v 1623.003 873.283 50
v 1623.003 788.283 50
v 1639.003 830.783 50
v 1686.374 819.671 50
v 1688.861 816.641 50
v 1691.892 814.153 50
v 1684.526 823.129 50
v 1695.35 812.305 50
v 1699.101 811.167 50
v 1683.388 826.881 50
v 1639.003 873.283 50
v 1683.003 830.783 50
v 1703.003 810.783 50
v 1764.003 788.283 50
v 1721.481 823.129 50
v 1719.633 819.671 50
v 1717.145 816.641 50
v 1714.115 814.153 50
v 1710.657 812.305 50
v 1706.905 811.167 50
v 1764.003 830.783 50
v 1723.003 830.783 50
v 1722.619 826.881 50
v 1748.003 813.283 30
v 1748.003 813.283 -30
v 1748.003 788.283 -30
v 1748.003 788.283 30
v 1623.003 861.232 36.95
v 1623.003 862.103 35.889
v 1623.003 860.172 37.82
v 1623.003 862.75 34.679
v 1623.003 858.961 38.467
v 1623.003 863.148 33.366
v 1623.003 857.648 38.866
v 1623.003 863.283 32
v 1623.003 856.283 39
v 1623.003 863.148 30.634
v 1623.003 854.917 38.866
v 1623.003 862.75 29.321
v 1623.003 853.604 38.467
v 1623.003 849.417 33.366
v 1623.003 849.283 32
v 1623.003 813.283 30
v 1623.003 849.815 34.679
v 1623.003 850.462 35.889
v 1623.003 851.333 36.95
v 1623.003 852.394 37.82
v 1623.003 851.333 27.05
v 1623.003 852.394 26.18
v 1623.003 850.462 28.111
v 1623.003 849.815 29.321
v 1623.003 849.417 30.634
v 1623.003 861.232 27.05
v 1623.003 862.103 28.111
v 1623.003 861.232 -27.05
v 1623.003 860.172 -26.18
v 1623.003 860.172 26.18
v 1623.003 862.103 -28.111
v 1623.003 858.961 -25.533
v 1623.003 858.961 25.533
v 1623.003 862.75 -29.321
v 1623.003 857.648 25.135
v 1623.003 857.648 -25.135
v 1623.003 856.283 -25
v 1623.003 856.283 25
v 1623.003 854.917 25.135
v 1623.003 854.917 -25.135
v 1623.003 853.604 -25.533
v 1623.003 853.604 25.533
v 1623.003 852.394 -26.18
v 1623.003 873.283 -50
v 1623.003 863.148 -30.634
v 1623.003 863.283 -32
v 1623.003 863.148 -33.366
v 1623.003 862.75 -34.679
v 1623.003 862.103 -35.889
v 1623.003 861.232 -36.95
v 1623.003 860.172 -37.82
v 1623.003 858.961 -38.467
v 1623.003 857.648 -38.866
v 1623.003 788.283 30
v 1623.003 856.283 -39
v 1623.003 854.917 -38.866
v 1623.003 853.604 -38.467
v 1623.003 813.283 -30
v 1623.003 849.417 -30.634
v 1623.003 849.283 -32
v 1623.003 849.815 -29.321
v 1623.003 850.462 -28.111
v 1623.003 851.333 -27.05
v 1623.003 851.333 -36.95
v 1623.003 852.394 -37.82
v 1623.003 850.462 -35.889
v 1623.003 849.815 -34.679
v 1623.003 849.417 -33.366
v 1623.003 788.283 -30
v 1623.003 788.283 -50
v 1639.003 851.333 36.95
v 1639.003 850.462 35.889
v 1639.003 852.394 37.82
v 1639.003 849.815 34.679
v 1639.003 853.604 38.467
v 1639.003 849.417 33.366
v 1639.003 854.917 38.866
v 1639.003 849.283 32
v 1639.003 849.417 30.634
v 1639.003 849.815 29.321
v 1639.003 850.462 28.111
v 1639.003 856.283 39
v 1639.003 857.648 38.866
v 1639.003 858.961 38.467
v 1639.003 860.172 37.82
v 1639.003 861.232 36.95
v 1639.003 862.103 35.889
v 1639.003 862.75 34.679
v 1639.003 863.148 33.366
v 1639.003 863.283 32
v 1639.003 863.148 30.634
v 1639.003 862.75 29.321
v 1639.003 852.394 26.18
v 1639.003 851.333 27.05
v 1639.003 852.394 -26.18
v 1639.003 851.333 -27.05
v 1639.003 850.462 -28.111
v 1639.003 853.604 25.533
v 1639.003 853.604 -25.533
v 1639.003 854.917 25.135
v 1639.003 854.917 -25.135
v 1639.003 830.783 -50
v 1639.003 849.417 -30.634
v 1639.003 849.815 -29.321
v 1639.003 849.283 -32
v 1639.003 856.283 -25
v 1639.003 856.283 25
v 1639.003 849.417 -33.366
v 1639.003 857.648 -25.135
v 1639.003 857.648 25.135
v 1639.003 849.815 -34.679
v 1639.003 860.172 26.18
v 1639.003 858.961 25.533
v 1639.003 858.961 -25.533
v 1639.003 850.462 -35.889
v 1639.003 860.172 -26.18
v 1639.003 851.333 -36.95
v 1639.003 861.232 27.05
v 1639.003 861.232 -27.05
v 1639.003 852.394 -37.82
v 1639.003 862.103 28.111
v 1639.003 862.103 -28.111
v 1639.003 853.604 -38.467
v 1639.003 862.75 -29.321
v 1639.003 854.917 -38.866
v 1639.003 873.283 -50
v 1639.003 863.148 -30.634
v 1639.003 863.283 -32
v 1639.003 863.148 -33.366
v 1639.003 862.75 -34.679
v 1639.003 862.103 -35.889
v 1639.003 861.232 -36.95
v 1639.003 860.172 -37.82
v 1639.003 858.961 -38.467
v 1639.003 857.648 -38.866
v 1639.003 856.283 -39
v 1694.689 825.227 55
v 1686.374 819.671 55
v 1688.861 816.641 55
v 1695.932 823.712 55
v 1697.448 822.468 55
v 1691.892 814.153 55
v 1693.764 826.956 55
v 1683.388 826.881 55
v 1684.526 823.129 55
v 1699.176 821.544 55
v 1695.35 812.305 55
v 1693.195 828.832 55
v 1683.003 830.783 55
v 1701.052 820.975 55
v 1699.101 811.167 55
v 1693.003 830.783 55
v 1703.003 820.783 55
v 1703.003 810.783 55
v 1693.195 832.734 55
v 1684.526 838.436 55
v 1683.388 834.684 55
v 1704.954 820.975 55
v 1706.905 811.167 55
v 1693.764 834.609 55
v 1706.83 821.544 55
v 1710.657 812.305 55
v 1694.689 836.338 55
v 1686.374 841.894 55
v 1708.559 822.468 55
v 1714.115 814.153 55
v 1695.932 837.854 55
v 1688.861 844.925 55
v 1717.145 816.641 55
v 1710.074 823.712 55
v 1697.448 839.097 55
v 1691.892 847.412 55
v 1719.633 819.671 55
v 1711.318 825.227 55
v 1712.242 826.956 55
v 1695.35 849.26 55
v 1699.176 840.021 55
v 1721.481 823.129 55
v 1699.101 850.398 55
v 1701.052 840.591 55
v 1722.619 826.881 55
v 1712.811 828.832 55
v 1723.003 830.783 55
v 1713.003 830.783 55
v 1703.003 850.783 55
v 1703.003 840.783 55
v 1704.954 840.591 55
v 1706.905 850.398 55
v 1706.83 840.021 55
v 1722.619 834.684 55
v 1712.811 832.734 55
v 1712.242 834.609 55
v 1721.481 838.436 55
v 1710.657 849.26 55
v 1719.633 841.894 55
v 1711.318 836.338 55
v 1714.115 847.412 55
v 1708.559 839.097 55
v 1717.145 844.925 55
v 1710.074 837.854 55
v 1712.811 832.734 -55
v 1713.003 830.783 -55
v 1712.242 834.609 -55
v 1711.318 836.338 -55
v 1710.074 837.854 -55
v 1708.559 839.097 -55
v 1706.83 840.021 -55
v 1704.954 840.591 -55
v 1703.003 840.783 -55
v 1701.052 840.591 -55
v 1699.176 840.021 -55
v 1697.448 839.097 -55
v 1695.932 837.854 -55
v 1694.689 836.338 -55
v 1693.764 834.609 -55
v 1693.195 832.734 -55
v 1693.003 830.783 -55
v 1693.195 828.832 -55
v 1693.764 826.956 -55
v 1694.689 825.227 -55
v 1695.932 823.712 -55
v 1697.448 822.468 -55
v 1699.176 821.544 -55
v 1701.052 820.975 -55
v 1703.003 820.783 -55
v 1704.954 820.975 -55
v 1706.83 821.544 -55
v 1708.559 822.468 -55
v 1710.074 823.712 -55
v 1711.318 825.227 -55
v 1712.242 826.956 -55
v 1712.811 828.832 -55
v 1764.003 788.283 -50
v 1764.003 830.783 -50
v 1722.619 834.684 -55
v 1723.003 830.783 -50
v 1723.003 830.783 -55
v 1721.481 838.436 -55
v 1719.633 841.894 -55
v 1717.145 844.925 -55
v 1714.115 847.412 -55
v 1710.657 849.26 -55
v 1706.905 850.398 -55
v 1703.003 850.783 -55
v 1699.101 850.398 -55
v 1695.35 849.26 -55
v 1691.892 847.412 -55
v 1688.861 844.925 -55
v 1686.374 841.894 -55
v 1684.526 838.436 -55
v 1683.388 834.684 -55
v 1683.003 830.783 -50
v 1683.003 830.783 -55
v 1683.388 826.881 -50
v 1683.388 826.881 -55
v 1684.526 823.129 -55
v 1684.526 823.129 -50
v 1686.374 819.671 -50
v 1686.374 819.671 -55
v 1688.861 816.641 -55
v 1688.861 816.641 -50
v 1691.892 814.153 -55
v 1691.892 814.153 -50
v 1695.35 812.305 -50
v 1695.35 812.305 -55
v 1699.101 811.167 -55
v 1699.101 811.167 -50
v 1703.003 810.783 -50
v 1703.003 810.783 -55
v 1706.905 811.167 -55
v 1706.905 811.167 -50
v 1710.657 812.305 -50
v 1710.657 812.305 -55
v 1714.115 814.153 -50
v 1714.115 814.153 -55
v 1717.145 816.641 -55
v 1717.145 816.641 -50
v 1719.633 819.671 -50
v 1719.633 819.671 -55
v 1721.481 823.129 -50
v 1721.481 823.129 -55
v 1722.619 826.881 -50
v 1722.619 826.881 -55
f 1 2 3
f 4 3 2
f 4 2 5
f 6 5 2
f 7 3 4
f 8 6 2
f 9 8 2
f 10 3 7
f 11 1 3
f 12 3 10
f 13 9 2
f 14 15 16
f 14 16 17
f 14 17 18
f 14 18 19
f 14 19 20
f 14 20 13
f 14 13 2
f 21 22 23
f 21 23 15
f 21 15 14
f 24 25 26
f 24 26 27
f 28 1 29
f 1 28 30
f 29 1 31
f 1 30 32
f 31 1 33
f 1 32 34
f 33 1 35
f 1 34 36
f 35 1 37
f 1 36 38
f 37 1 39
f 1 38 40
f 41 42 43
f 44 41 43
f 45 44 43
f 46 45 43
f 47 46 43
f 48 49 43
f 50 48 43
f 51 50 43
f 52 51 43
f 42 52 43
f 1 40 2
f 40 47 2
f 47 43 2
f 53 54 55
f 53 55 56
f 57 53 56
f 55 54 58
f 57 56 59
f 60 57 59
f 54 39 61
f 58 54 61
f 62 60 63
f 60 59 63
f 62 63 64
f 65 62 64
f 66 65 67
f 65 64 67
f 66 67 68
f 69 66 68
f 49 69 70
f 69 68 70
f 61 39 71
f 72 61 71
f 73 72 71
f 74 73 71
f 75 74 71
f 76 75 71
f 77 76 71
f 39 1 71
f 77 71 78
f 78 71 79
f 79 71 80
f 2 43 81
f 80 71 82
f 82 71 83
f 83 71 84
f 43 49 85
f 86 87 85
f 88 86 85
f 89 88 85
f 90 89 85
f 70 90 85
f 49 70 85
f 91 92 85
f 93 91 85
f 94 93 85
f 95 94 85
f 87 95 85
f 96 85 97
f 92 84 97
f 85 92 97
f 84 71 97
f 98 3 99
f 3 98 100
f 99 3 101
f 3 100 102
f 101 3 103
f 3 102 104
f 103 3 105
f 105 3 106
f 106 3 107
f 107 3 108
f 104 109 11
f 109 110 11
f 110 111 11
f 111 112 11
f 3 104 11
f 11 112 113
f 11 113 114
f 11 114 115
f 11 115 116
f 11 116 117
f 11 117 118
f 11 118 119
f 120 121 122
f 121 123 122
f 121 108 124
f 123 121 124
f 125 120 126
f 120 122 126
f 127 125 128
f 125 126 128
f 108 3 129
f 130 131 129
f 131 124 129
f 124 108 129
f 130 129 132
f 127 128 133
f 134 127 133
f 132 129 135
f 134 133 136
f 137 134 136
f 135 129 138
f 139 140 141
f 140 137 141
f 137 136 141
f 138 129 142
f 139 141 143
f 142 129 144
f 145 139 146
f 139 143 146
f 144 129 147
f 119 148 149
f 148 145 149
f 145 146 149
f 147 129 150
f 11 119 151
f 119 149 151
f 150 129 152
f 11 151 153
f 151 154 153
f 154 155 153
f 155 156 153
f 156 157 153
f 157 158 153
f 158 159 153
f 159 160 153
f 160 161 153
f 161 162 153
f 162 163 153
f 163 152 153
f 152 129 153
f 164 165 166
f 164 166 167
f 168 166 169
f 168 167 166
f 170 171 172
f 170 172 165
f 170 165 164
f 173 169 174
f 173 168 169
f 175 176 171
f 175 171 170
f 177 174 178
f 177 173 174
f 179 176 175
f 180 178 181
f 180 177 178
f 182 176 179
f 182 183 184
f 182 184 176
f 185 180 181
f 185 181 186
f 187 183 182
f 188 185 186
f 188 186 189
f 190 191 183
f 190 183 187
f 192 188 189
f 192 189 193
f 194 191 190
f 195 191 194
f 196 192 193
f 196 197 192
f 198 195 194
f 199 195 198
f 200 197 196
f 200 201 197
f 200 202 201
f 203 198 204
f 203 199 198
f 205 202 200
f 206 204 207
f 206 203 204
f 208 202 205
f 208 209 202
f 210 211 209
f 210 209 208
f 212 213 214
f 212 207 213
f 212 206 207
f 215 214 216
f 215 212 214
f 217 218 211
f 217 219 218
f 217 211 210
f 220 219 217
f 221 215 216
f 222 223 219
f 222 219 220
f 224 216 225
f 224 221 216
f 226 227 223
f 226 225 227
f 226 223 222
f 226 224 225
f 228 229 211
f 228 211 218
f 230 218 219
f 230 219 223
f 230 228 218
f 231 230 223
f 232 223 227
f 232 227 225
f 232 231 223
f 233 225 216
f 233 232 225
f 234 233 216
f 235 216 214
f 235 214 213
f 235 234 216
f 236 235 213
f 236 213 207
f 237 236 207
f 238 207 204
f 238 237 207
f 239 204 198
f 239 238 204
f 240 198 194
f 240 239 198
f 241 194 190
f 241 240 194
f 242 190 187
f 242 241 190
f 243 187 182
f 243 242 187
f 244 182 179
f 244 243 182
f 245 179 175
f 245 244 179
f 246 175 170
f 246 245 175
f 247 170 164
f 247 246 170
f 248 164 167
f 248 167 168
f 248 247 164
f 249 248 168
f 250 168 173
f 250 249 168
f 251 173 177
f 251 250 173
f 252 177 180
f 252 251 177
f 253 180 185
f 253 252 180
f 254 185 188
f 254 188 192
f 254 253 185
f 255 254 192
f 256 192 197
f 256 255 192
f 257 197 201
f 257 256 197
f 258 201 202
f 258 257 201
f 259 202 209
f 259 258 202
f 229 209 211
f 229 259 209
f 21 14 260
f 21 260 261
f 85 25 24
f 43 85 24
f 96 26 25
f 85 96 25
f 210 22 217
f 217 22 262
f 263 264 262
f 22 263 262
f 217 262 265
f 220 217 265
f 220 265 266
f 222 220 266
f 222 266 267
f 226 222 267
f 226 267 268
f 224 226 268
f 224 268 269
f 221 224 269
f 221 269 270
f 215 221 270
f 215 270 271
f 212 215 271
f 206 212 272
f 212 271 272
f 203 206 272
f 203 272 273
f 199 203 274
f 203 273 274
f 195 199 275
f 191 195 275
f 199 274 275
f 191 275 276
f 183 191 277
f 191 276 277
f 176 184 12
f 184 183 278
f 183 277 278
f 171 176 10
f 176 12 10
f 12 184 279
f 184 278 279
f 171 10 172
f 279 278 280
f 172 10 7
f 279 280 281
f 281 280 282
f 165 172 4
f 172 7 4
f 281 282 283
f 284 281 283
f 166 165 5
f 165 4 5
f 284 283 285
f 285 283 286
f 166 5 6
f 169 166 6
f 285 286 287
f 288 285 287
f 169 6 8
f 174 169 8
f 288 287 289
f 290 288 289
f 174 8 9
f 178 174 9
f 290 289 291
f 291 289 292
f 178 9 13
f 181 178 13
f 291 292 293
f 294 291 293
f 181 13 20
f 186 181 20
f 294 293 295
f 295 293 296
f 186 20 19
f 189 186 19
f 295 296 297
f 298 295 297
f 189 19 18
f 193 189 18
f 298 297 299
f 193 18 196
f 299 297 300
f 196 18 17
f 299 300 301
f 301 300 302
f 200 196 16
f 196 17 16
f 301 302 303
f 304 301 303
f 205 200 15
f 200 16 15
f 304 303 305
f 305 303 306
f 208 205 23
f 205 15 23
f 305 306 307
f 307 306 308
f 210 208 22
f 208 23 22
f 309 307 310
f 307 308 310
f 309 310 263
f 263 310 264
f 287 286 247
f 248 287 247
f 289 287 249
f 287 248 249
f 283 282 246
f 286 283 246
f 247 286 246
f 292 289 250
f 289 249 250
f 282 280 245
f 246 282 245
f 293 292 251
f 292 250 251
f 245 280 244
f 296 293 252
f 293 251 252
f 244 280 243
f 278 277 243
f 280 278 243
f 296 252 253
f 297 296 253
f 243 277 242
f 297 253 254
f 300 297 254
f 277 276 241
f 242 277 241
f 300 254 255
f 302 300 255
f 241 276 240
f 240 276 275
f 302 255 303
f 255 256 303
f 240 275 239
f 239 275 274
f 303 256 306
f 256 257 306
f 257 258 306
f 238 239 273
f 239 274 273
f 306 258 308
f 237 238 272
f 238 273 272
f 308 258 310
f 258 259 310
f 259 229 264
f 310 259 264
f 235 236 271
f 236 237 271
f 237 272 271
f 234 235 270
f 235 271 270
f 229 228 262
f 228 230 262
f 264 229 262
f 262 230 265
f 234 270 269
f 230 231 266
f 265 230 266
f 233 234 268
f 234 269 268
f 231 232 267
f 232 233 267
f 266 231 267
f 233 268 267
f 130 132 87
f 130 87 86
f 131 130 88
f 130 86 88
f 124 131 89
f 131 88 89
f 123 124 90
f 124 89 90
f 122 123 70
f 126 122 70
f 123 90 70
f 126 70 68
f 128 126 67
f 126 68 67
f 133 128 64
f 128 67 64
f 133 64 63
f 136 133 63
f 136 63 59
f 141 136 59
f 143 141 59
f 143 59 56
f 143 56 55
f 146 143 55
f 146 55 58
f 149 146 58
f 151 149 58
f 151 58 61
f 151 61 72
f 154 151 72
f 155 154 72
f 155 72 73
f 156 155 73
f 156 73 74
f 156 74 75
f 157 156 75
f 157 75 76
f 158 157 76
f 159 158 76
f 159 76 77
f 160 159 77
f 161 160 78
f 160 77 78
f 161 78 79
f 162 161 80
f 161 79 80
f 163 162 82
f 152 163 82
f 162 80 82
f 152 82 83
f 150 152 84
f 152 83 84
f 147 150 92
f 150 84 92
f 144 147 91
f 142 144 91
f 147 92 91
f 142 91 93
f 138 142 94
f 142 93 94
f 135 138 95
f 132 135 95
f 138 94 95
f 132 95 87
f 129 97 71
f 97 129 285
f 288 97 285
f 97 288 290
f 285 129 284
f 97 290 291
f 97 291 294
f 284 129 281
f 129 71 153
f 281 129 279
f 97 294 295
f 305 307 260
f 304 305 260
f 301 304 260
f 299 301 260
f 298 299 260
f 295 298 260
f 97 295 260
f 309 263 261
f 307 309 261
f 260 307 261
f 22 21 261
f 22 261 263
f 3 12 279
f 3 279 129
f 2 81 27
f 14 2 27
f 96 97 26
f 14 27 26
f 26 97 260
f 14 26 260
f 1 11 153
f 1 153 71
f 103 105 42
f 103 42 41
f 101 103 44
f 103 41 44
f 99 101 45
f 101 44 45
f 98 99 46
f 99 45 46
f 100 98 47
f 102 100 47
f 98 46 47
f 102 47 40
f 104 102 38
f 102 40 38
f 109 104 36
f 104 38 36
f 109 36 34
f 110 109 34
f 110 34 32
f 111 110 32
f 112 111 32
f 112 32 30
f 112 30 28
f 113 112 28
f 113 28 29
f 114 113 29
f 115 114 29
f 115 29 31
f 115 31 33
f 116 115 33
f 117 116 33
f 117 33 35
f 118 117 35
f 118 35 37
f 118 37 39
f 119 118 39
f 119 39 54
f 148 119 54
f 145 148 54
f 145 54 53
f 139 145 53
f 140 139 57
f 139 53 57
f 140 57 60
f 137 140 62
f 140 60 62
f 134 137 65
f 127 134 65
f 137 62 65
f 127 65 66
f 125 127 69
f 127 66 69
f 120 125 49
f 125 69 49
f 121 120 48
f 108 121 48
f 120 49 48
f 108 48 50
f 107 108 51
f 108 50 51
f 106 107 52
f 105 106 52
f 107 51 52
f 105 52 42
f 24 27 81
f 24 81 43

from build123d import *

# Parameters (mm, degrees)
BOSS_EXTRUDE1_DEPTH      = 1270
BOSS_EXTRUDE1_DEPTH_BACK = 1270
BOSS_EXTRUDE2_DEPTH      = 1397
BOSS_EXTRUDE2_DEPTH_BACK = 1397
SKETCH1_3_R              = 254
SKETCH2_W                = 1524
SKETCH2_H                = 635
CUT_EXTRUDE1_DEPTH       = 3175
SKETCH3_R                = 177.8
CUT_EXTRUDE2_DEPTH       = 508
SCALE1_SCALE             = 0.0393701


with BuildPart() as part:
    # Sketch1 → Boss-Extrude1 (new, two sides: drawn at the far end of the back side and taken through both)
    with BuildSketch(Plane.XY.offset(-BOSS_EXTRUDE1_DEPTH_BACK)):
        with BuildLine():
            Line((0, 2159), (0, 0))
            Line((0, 0), (3581.4, 0))
            Line((3581.4, 0), (3581.4, 1079.5))
            Line((3581.4, 1079.5), (2540, 1079.5))
            ThreePointArc((2540, 1079.5), (2032, 571.5), (1524, 1079.5))
            Line((1524, 1079.5), (406.4, 1079.5))
            Line((406.4, 1079.5), (406.4, 2159))
            Line((406.4, 2159), (0, 2159))
        make_face()
    extrude(amount=BOSS_EXTRUDE1_DEPTH + BOSS_EXTRUDE1_DEPTH_BACK)

    # Sketch1<3> → Boss-Extrude2 (add, two sides: drawn at the far end of the back side and taken through both)
    with BuildSketch(Plane.XY.offset(-BOSS_EXTRUDE2_DEPTH_BACK)):
        with BuildLine():
            ThreePointArc((1524, 1079.5), (2032, 571.5), (2540, 1079.5))
            ThreePointArc((2540, 1079.5), (2032, 1587.5), (1524, 1079.5))
        make_face()
        with Locations((2032, 1079.5)):
            Circle(SKETCH1_3_R, mode=Mode.SUBTRACT)
    extrude(amount=BOSS_EXTRUDE2_DEPTH + BOSS_EXTRUDE2_DEPTH_BACK)

    # Sketch2 → Cut-Extrude1 (cut)
    with BuildSketch(Plane.ZY):
        with Locations((0, 317.5)):
            Rectangle(SKETCH2_W, SKETCH2_H)
    extrude(amount=-CUT_EXTRUDE1_DEPTH, mode=Mode.SUBTRACT)

    # Sketch3 → Cut-Extrude2 (cut)
    with BuildSketch(Plane.ZY):
        with Locations((-812.8, 1727.2)):
            Circle(SKETCH3_R)
        with Locations((812.8, 1727.2)):
            Circle(SKETCH3_R)
    extrude(amount=-CUT_EXTRUDE2_DEPTH, mode=Mode.SUBTRACT)


with BuildPart() as part_1:
    # Scale1: scaled about (1689.519743013, 820.589305636, 0)
    add(part.part.scale(SCALE1_SCALE).moved(Location((1623.003181779, 788.282622614, 0))))


solid = part_1.part
